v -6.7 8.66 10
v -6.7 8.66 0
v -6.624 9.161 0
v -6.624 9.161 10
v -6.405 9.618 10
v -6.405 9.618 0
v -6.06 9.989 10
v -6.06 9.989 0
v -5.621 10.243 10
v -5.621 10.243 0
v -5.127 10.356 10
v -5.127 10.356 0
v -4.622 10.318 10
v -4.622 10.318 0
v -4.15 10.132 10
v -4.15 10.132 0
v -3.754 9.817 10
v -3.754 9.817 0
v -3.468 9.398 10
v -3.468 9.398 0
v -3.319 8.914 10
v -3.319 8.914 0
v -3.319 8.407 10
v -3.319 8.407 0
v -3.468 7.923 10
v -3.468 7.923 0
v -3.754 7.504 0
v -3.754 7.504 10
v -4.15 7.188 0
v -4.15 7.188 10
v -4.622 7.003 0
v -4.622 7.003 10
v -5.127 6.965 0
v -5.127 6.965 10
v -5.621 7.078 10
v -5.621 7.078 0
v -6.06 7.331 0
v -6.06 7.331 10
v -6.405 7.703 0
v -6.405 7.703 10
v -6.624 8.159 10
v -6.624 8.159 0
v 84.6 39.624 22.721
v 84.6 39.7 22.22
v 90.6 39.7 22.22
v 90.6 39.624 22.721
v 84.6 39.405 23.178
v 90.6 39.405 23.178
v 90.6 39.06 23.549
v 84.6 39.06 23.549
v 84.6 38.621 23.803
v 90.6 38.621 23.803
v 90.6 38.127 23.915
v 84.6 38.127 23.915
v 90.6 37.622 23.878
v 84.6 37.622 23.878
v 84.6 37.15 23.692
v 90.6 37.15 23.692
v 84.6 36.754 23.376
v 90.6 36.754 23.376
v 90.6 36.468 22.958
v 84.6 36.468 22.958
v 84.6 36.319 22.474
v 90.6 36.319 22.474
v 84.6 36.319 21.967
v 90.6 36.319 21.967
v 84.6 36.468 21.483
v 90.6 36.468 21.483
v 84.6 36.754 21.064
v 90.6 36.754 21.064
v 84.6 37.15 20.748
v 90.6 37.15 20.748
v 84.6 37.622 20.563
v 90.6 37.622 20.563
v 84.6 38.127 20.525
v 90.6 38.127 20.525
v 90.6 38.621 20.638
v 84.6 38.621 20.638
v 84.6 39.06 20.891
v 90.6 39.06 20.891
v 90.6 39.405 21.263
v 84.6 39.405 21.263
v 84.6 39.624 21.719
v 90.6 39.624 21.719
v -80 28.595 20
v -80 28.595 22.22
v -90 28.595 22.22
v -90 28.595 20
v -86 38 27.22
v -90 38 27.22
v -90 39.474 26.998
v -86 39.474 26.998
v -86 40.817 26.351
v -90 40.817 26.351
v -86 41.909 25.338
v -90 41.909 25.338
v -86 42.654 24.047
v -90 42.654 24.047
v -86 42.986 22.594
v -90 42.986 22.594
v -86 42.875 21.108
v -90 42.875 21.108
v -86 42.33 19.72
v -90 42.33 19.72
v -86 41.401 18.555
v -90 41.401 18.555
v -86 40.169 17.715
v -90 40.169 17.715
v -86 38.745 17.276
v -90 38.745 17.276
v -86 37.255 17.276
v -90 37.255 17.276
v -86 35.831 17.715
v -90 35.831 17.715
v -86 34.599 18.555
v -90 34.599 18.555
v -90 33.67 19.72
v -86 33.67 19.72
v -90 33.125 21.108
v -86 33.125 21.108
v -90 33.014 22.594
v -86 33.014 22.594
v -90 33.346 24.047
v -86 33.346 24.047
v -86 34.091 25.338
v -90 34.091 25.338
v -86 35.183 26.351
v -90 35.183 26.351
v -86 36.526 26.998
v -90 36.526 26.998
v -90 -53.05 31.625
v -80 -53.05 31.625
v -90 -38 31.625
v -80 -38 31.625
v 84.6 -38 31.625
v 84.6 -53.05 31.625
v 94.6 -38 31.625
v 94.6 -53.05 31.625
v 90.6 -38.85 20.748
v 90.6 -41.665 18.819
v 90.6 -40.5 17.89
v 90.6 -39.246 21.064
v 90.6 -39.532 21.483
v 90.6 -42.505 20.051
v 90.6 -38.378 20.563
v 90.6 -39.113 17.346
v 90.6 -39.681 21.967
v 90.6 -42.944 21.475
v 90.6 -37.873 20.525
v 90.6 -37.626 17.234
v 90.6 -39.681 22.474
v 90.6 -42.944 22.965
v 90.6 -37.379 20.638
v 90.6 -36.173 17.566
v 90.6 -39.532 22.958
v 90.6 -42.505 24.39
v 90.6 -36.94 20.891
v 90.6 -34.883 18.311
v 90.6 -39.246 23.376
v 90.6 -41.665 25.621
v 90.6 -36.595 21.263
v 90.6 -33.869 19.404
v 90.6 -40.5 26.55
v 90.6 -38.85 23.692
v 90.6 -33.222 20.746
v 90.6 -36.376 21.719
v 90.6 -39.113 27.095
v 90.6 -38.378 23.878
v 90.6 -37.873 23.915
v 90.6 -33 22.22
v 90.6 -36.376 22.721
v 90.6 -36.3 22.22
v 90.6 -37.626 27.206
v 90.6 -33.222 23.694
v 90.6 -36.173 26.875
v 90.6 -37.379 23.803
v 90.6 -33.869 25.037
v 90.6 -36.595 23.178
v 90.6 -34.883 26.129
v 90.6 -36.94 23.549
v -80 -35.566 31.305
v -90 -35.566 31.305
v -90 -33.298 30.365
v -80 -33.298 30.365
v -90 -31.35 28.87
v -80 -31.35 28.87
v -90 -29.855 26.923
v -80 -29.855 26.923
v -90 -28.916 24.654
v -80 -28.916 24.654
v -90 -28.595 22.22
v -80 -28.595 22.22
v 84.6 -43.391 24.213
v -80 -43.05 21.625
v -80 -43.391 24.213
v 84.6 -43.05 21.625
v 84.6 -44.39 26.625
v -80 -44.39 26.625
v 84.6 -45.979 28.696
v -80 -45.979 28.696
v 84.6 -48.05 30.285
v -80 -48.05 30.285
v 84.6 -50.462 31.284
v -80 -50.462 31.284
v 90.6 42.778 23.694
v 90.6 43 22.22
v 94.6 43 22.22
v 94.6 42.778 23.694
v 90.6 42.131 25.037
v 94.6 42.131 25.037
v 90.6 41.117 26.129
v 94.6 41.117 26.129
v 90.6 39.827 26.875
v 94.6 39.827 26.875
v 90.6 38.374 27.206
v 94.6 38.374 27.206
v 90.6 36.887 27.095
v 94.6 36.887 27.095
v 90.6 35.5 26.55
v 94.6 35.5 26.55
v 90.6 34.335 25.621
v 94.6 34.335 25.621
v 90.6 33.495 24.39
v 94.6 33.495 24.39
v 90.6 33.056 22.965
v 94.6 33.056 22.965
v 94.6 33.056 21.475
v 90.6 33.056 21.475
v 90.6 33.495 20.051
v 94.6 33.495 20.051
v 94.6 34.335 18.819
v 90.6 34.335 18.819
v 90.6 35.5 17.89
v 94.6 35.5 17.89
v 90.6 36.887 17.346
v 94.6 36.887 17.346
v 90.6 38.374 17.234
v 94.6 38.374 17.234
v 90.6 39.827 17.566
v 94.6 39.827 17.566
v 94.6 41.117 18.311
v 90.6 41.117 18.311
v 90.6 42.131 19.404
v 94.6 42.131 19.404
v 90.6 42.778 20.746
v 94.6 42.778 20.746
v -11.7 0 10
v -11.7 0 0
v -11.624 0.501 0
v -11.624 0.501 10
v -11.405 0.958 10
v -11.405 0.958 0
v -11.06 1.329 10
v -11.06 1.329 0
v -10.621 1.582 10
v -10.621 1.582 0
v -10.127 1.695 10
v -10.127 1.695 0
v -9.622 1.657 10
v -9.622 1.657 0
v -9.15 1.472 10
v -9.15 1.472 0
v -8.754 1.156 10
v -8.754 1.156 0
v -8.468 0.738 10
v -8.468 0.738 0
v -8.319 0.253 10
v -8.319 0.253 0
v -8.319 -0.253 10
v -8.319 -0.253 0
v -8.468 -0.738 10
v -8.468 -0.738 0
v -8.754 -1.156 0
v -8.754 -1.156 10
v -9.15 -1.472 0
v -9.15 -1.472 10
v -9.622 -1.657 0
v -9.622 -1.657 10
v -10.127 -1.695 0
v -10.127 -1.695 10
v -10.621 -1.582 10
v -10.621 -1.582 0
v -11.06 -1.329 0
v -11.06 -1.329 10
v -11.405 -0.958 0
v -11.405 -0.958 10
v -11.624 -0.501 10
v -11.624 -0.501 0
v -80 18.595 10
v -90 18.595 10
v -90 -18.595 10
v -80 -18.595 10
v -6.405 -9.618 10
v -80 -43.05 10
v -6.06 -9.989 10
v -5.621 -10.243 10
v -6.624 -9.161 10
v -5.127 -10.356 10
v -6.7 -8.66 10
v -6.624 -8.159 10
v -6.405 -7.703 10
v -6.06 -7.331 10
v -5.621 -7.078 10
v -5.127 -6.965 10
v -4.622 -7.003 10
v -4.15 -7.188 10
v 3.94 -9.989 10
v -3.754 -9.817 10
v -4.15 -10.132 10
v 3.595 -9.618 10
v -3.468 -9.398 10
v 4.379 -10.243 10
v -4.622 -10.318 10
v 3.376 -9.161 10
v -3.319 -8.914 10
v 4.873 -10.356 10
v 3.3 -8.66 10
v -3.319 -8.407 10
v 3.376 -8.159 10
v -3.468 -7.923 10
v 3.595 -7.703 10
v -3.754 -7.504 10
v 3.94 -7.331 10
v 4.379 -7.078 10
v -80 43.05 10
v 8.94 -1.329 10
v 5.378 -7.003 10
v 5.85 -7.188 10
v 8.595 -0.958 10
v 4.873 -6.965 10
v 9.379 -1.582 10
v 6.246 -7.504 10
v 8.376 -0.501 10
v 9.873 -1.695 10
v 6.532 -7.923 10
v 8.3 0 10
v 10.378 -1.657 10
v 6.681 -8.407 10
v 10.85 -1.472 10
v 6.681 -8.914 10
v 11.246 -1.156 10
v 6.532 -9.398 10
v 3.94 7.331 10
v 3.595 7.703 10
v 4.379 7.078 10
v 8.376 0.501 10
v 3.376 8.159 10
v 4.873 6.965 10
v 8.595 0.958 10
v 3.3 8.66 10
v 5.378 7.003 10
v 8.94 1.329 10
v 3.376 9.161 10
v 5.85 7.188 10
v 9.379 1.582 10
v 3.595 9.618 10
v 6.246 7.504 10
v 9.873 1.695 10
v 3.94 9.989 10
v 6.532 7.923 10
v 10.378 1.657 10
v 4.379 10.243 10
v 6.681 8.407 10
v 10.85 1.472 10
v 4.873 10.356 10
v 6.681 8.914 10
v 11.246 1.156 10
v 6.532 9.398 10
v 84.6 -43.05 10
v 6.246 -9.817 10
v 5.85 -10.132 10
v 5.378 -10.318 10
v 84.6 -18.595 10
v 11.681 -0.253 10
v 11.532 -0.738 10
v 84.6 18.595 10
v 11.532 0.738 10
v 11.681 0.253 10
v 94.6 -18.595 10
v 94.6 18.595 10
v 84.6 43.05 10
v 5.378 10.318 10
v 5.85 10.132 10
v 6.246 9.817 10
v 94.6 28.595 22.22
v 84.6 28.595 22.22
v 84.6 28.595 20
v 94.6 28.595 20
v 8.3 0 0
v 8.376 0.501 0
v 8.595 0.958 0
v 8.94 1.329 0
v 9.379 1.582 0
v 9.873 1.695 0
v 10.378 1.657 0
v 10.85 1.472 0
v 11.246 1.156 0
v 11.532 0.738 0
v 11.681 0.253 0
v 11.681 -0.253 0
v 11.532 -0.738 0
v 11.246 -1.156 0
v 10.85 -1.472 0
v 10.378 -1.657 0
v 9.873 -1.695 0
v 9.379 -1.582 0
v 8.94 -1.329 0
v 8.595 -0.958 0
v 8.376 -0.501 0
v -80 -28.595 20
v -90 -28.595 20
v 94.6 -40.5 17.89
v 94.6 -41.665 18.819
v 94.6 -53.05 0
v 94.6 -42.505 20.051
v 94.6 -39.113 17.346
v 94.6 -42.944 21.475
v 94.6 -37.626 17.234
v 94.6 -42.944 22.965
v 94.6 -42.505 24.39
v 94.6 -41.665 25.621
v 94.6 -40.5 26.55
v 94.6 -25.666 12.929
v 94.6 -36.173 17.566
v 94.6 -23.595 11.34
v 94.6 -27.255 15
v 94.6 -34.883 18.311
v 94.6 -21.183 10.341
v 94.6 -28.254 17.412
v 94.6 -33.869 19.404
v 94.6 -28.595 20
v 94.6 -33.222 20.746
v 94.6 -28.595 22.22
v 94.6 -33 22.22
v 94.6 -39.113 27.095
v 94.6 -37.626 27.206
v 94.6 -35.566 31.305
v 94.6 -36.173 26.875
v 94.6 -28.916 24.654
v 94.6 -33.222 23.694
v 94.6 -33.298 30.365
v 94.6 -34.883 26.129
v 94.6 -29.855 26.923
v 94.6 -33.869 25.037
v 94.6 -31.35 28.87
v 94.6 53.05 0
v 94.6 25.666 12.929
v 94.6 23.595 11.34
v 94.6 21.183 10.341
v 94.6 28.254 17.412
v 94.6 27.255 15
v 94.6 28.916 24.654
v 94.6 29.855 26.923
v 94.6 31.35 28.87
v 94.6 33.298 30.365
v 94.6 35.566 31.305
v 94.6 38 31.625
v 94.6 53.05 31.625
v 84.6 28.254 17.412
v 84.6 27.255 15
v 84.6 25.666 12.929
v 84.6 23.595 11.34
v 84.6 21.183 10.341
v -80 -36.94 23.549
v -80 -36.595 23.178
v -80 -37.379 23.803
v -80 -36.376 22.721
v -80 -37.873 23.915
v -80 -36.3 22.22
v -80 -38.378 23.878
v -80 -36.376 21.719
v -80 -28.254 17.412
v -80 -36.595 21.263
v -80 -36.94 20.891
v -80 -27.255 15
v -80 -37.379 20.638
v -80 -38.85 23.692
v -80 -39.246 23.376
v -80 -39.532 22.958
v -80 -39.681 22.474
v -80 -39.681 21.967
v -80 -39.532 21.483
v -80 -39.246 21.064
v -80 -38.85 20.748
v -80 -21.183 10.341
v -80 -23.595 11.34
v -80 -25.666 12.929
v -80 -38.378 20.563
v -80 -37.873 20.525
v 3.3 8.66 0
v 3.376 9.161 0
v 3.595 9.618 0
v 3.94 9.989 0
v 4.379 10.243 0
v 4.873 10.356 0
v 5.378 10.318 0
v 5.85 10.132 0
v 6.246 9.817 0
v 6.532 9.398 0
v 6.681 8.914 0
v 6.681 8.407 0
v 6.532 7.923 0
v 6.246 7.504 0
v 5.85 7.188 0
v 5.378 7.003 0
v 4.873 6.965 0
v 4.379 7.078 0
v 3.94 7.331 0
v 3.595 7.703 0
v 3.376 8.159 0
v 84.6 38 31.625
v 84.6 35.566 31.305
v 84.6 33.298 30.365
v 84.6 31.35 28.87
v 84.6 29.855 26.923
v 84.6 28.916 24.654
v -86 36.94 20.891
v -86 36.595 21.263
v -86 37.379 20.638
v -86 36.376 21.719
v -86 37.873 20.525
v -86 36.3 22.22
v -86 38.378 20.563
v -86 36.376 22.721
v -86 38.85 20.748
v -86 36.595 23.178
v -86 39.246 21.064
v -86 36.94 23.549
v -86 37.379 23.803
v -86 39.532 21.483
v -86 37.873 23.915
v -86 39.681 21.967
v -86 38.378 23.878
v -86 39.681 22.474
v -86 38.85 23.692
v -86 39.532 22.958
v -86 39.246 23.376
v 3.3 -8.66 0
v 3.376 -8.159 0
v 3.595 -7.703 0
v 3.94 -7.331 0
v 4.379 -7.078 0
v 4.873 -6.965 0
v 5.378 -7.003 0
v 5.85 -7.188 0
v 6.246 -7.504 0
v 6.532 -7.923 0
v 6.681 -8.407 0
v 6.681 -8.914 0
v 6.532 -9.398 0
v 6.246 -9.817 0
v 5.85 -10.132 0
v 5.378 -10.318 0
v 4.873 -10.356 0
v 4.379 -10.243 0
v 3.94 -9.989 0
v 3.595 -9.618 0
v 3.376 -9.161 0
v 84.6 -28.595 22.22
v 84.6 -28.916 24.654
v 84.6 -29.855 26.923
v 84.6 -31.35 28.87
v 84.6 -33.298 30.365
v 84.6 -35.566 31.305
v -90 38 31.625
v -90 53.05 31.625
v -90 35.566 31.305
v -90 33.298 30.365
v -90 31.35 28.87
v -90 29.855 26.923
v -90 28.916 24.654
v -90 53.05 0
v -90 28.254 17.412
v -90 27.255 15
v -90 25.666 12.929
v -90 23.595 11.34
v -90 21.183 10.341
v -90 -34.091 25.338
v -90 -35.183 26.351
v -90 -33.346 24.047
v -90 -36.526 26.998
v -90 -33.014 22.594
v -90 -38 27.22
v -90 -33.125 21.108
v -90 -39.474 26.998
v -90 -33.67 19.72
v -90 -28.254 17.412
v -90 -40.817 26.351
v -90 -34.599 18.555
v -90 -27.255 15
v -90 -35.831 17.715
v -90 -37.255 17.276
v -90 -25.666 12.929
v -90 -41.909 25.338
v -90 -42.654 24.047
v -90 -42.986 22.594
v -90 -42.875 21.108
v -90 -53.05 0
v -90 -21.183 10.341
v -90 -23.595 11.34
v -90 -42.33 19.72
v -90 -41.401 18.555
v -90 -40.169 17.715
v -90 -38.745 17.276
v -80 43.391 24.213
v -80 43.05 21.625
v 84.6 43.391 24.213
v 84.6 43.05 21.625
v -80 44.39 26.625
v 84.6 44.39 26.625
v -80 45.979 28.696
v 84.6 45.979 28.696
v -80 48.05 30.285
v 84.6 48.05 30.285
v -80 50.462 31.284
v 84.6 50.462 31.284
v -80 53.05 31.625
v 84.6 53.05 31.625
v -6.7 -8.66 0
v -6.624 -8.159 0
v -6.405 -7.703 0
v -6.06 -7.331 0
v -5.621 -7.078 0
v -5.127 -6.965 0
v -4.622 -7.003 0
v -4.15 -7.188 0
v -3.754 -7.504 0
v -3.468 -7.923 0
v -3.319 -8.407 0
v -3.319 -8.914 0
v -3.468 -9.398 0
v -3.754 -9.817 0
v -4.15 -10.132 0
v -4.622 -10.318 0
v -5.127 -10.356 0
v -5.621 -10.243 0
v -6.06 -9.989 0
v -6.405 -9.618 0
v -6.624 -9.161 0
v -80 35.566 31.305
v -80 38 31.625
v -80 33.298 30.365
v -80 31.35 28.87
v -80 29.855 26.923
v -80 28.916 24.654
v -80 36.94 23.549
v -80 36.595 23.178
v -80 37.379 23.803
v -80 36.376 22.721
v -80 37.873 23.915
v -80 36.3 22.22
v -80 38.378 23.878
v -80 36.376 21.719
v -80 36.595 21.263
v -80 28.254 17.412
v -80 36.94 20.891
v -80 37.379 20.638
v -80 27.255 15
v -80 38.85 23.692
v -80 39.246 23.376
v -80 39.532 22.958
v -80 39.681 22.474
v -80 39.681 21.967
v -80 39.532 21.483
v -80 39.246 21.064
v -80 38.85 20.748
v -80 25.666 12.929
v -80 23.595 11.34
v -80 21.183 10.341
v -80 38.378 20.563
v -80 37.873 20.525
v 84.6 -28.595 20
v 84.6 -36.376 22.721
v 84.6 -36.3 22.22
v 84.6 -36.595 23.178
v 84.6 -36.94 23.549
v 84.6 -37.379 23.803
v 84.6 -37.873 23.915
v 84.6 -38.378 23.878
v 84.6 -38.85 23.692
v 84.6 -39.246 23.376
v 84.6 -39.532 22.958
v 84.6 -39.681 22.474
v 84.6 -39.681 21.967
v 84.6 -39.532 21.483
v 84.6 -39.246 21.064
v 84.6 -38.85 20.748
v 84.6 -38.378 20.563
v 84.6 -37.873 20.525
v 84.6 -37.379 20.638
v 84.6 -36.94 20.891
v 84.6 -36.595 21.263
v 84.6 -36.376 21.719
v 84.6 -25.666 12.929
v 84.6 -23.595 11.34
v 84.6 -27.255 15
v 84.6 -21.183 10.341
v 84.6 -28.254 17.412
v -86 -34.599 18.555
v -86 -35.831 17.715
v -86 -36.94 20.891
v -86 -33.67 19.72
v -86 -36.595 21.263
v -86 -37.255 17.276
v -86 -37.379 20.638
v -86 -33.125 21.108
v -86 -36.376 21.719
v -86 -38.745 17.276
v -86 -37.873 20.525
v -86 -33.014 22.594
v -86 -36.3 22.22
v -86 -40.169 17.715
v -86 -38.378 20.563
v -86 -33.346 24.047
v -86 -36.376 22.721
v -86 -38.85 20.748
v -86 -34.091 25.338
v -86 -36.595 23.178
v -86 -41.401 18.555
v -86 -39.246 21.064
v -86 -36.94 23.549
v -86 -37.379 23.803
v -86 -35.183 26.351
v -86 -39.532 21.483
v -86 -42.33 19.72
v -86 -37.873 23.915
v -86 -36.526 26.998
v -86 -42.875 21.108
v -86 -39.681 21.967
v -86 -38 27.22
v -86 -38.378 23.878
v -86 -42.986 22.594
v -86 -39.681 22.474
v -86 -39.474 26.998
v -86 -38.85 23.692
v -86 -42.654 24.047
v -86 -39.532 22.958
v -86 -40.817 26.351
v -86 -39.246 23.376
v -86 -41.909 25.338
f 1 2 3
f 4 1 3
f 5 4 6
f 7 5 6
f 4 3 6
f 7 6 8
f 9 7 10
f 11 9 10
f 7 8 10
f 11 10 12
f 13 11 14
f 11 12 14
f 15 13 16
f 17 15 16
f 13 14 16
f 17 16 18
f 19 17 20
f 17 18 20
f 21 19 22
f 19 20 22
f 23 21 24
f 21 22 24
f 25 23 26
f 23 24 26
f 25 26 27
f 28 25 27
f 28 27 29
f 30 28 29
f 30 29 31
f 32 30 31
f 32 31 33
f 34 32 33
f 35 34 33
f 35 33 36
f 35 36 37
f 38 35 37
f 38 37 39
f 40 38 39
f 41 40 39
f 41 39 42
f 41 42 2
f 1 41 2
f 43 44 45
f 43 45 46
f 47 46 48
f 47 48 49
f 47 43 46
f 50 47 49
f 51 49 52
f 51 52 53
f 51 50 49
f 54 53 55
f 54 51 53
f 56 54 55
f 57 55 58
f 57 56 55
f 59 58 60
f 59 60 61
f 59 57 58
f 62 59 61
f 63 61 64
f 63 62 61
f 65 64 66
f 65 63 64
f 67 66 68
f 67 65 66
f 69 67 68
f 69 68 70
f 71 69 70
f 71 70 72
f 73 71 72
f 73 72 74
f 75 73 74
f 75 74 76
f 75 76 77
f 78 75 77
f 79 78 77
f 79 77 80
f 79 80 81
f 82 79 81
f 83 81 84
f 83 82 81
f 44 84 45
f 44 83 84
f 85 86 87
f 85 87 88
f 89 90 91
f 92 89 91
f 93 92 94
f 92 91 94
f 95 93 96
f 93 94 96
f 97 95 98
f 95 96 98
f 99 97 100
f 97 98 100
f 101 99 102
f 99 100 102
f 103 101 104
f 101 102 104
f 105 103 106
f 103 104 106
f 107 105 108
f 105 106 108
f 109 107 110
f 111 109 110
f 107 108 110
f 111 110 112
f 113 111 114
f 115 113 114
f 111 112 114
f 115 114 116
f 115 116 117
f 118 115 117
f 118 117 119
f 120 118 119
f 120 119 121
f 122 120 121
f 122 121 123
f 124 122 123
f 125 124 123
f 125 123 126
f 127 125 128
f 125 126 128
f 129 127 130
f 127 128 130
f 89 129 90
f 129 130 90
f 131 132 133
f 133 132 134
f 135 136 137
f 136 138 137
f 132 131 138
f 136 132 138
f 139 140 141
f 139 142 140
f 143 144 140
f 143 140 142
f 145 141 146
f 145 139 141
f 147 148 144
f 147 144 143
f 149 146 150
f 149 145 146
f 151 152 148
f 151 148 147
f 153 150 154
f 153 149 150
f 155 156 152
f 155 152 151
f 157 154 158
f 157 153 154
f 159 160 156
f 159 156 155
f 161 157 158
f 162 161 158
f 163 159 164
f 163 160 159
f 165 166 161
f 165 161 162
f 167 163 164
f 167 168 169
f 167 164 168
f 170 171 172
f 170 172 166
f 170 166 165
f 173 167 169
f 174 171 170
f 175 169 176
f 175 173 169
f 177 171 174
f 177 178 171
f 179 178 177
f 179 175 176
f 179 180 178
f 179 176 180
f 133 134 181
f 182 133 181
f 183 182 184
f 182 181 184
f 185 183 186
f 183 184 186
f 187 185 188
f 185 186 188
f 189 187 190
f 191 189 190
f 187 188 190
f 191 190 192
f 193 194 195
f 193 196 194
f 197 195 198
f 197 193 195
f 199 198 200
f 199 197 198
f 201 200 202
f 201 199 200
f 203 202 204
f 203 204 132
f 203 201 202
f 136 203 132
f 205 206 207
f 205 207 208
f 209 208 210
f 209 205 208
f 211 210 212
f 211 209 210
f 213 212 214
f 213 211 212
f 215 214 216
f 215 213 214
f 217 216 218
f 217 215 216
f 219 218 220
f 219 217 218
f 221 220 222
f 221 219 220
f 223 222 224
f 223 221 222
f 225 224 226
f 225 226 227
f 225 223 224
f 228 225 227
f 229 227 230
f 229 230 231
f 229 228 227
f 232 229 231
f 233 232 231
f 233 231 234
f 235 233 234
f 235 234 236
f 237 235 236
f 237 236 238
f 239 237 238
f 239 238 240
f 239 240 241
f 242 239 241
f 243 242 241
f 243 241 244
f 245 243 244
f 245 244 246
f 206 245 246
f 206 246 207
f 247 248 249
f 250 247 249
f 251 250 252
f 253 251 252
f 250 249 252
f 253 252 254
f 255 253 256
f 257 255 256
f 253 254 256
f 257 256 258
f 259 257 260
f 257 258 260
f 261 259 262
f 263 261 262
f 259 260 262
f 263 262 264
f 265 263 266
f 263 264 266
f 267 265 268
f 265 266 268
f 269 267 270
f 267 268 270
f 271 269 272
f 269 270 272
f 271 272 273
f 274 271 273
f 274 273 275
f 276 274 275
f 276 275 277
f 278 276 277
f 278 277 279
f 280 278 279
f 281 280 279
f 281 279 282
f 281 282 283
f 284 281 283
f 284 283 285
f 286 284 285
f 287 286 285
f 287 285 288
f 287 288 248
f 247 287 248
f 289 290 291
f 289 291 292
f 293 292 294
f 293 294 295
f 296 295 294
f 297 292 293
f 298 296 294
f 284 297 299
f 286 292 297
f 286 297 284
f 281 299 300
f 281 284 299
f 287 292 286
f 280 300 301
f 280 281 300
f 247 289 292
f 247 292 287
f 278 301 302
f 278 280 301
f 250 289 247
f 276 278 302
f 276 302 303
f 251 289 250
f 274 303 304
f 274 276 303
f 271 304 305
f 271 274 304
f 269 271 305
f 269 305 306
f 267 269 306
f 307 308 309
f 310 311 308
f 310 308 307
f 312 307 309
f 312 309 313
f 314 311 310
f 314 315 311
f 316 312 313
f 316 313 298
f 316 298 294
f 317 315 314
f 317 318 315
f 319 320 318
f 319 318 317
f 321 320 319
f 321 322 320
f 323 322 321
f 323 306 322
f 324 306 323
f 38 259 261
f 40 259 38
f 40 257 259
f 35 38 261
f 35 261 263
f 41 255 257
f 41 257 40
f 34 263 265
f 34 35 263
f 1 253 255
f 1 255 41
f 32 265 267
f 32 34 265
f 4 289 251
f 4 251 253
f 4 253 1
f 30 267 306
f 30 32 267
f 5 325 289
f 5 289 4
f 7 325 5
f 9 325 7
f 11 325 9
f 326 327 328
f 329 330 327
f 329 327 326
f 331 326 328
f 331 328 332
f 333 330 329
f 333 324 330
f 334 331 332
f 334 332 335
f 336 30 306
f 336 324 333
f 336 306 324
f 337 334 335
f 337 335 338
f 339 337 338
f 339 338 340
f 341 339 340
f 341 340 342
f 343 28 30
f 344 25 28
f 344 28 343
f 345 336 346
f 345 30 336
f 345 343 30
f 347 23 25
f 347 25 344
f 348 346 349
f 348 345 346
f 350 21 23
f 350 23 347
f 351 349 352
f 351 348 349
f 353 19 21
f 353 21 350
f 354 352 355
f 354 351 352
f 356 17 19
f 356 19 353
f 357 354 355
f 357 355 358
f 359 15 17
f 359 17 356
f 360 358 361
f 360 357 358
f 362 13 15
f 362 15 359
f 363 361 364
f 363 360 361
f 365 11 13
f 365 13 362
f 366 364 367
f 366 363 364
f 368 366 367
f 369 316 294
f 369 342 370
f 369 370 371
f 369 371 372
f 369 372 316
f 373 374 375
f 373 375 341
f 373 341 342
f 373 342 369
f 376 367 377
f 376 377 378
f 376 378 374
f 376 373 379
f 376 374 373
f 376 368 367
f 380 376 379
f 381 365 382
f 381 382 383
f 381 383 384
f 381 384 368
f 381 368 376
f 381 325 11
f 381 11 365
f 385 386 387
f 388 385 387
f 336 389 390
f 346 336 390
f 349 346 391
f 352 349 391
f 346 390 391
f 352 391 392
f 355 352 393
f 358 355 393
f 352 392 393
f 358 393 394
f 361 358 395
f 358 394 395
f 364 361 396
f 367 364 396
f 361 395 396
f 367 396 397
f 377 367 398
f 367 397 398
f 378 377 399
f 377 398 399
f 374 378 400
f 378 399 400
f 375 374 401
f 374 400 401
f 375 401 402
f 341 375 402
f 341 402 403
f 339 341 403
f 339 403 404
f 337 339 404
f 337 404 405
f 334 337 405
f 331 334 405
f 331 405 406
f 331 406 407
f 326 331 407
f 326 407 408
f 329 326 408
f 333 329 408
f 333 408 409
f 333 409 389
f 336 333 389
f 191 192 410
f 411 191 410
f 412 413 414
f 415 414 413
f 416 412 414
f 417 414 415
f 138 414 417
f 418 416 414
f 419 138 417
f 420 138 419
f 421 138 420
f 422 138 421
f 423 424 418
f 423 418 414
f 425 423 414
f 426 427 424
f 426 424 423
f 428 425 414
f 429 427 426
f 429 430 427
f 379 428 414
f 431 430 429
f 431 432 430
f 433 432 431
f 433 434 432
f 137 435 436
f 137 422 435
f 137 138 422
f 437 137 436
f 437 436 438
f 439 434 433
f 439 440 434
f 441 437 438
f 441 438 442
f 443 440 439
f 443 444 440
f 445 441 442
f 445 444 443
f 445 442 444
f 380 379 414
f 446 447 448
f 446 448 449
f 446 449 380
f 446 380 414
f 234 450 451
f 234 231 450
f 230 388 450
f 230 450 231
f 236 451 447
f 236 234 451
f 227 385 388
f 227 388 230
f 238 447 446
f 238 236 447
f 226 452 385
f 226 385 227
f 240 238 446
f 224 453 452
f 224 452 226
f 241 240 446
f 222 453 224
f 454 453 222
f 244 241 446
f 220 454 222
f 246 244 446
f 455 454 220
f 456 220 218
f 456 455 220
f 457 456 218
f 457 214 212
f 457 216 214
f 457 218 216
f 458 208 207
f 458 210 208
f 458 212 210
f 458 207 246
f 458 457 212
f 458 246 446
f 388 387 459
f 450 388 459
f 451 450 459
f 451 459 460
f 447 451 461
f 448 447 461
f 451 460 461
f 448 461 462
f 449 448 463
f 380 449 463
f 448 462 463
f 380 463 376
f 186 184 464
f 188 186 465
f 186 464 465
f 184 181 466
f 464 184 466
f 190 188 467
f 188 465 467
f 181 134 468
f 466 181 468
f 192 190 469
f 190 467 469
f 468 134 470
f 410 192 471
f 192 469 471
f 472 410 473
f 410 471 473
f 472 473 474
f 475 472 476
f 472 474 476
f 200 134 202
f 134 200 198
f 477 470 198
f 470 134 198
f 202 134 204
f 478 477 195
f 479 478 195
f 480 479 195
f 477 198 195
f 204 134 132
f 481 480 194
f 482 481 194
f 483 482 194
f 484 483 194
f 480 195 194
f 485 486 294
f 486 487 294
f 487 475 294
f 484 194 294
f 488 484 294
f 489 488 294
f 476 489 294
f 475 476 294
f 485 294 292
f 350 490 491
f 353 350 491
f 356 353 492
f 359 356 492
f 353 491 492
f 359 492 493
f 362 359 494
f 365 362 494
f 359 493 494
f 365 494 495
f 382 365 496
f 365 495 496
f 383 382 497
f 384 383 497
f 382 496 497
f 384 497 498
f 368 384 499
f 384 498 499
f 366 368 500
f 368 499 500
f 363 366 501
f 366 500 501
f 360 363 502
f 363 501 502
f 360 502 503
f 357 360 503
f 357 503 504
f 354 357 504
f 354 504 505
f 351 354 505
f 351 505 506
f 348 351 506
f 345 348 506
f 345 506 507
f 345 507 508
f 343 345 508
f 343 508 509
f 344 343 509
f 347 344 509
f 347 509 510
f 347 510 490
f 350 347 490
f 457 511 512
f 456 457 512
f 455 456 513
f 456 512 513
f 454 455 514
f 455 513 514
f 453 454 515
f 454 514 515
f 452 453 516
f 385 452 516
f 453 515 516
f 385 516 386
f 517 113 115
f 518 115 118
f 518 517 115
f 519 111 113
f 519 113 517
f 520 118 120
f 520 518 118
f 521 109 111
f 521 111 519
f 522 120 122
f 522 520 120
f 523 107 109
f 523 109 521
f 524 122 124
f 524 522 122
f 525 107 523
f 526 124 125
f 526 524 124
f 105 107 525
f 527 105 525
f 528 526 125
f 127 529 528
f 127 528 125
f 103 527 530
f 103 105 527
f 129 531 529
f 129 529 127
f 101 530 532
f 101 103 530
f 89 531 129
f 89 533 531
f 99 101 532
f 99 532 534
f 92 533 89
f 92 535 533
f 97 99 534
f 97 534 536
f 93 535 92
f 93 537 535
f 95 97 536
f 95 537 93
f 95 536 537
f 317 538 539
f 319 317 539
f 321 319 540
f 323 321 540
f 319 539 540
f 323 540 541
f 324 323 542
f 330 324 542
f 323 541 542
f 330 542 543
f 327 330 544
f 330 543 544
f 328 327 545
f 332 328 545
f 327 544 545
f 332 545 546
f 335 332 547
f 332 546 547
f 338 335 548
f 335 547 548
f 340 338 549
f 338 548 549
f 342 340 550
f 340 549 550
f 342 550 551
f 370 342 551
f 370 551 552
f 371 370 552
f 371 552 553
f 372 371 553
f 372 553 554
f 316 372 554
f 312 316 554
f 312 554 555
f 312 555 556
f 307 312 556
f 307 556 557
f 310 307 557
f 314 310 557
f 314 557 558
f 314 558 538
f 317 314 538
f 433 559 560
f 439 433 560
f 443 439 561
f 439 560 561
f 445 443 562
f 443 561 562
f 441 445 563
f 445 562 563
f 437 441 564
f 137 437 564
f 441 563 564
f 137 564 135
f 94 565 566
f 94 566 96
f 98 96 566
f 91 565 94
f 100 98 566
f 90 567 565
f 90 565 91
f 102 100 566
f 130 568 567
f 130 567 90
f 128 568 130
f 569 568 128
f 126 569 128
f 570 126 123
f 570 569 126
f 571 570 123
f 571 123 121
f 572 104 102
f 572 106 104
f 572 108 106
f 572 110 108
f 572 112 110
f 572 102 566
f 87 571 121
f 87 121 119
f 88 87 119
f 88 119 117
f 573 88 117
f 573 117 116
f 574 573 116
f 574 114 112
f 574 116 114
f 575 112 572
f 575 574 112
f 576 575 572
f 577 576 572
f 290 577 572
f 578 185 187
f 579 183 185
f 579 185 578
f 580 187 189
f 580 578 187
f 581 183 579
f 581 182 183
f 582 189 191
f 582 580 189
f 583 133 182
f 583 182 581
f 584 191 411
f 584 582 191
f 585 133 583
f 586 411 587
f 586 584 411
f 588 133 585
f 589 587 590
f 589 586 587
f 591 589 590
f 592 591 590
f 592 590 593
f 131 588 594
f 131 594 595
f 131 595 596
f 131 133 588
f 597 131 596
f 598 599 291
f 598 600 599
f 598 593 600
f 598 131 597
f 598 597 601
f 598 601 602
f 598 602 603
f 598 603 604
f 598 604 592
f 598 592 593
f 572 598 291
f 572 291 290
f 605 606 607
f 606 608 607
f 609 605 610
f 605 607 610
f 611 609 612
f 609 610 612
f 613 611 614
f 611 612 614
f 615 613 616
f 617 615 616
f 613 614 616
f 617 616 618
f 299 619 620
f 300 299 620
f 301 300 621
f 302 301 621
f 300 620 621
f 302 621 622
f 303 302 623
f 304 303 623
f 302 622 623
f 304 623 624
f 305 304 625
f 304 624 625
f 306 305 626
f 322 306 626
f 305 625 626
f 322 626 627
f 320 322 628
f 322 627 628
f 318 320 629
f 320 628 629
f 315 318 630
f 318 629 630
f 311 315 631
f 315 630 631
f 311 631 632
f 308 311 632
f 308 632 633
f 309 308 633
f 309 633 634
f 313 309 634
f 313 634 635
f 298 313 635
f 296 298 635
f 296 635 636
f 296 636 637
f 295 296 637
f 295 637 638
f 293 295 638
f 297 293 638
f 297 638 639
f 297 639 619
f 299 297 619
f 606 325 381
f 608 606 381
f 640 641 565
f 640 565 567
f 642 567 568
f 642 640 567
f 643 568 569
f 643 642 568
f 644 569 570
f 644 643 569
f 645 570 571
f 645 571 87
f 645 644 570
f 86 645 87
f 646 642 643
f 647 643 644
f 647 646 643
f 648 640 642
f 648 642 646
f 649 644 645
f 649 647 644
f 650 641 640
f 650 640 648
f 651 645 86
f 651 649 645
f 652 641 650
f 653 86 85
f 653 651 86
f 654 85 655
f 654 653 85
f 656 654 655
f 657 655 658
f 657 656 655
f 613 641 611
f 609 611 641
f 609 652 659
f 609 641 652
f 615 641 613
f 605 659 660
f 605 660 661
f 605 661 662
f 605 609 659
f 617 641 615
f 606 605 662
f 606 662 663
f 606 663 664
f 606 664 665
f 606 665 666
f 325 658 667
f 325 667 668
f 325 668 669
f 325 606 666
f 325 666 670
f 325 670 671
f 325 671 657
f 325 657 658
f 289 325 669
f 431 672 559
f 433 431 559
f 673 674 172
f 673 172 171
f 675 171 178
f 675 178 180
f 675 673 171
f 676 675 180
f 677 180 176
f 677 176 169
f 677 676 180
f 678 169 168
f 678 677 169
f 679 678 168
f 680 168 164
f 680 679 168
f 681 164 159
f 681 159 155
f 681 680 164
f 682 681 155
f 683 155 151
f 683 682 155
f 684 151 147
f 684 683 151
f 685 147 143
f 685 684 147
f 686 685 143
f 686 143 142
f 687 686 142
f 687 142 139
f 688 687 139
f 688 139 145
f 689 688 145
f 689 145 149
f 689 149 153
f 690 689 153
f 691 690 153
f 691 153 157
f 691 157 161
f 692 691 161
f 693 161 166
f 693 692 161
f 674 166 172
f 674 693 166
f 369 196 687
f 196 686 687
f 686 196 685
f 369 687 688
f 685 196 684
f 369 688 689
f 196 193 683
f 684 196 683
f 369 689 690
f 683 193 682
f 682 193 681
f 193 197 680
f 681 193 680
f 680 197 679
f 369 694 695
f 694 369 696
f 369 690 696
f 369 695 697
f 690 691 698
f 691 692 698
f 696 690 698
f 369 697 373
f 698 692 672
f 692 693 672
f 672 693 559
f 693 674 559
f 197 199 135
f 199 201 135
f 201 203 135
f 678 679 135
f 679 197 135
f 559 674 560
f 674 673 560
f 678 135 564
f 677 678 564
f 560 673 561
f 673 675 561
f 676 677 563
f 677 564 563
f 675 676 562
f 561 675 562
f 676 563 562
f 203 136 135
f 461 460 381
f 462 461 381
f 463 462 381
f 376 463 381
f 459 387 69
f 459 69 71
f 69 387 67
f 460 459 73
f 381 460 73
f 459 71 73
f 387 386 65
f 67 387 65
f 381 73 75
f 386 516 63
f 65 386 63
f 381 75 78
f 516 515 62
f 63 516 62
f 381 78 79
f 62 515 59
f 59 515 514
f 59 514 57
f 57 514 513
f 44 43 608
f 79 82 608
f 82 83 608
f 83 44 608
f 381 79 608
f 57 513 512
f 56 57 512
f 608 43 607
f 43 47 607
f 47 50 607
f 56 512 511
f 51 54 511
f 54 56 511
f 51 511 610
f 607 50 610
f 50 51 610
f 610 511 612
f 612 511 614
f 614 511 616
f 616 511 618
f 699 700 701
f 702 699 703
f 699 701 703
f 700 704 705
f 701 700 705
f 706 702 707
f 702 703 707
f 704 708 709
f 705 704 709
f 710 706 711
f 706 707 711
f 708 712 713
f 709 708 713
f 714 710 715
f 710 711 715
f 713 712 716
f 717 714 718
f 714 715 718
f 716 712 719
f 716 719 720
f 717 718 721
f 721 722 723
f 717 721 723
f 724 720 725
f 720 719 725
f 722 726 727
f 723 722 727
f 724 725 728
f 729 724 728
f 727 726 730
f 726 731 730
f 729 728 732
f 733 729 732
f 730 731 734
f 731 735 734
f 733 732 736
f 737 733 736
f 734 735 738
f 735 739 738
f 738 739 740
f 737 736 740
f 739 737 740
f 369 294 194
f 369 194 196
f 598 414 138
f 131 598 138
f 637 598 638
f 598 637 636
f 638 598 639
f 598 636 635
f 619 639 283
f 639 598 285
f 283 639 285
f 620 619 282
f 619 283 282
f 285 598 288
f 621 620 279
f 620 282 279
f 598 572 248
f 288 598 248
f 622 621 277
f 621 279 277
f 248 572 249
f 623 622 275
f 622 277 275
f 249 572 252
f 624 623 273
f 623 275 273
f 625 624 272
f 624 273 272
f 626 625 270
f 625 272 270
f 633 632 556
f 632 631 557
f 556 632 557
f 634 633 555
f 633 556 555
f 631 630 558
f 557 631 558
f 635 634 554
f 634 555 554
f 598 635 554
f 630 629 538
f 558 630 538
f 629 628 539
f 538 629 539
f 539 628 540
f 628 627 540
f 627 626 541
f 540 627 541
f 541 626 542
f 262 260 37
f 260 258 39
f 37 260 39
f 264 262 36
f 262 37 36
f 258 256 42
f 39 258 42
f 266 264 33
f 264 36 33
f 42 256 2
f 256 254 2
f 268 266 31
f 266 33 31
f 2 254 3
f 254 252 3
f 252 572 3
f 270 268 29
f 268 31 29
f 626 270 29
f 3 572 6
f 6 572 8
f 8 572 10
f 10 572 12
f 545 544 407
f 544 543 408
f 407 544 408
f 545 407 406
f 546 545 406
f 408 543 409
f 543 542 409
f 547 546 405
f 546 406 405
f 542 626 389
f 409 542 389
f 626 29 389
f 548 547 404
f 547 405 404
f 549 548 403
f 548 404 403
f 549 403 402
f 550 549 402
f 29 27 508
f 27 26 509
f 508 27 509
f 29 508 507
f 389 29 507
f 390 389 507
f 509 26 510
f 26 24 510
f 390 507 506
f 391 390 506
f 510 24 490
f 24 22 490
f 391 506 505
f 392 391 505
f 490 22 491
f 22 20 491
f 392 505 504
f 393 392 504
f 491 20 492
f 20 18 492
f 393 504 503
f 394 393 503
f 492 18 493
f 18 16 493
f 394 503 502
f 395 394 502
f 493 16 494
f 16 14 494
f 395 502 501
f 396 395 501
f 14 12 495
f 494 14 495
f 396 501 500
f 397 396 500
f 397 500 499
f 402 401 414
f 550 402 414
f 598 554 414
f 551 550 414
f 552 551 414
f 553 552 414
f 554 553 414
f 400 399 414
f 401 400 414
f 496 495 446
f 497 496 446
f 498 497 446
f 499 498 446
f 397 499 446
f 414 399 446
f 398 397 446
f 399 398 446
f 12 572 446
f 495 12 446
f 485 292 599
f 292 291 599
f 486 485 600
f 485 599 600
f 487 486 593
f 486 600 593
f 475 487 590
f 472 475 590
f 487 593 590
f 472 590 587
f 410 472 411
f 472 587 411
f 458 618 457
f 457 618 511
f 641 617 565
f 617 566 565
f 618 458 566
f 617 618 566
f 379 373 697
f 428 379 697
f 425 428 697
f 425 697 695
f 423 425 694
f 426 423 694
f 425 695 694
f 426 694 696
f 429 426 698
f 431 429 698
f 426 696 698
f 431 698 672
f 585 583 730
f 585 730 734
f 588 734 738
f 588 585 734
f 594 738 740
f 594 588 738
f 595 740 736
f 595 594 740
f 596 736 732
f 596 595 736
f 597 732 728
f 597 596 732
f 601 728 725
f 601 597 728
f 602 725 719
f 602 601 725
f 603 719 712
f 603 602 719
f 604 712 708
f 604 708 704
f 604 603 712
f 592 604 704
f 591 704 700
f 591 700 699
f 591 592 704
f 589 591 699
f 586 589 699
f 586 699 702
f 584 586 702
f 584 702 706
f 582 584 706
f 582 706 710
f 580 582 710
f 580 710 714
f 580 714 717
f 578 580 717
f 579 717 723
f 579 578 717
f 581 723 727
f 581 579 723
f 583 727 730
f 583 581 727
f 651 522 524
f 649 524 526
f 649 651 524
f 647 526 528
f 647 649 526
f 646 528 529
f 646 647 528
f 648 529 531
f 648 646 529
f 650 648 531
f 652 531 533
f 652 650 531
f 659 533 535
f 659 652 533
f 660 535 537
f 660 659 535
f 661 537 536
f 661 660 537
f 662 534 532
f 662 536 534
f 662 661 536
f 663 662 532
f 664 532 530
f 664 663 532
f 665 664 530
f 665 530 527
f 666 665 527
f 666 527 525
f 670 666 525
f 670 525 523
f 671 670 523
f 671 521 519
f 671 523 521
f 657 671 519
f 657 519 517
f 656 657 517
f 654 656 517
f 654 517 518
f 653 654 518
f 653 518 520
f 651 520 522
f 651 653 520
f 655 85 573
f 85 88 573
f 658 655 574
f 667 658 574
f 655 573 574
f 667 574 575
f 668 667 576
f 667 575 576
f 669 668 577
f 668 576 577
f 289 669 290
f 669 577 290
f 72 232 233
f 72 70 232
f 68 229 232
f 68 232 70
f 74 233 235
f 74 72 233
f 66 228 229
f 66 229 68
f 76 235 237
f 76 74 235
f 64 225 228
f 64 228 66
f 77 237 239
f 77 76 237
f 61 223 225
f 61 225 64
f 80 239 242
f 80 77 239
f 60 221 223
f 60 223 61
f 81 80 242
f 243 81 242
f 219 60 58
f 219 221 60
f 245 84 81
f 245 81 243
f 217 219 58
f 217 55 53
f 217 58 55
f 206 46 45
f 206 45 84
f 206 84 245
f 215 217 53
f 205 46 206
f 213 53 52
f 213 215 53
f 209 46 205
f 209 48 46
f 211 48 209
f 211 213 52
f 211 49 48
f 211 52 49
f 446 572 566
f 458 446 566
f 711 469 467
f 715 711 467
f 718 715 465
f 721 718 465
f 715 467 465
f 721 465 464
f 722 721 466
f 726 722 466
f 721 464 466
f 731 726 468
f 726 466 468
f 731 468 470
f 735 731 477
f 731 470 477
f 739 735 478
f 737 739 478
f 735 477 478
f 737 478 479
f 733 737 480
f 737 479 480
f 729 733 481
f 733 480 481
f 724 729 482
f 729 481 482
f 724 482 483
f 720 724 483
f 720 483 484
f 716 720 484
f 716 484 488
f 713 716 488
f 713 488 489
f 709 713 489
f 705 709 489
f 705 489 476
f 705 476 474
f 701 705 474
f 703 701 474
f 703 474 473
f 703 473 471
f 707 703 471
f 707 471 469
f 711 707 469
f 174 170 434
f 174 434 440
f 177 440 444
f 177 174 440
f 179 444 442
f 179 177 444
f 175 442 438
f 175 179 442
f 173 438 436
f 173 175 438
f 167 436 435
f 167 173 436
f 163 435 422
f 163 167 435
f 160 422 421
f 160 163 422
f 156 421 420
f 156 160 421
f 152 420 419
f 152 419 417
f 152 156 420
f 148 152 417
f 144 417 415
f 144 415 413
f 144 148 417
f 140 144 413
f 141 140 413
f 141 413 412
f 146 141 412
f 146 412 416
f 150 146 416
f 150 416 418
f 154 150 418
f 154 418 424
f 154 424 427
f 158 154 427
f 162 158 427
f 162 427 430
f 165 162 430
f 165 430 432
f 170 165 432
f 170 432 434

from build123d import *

# Parameters (mm, degrees)
SKETCH1_W             = 184.6
SKETCH1_H             = 106.1
BOSS_EXTRUDE1_DEPTH   = 10
CUT_EXTRUDE2_REACH    = 110.92
SKETCH7_R             = 1.7
SKETCH3_W             = 164.6
SKETCH3_H             = 10
BOSS_EXTRUDE2_DEPTH   = 21.625
FILLET1_R             = 10
SKETCH5_R             = 1.7
BOSS_EXTRUDE3_DEPTH   = 10
SKETCH6_R             = 5
CUT_EXTRUDE1_DEPTH    = 4
FILLET2_R             = 10
FILLET2_OF_MIRROR1_R  = 10
MIRROR2_START         = 84.6
MIRROR2_OUTLINE_R     = 5
MIRROR2_DEPTH         = 10
MIRROR2_2_OUTLINE_R   = 5
MIRROR2_2_OUTLINE_R_2 = 1.7
MIRROR2_2_DEPTH       = 6


# Read off the part's stored shape, not the designer's step: Mirror2
with BuildPart() as part:
    # Sketch1 → Boss-Extrude1 (new body)
    with BuildSketch(Plane.XY):
        with Locations((2.3, 0)):
            Rectangle(SKETCH1_W, SKETCH1_H)
    extrude(amount=BOSS_EXTRUDE1_DEPTH)

    # Sketch7 → Cut-Extrude2 (cut, up to next)
    with BuildSketch(Plane(origin=(0, 0, 0), x_dir=(-1, 0, 0), z_dir=(0, 0, -1)), mode=Mode.PRIVATE) as cut_extrude2_sk1:
        with Locations((-10, 0)):
            Circle(SKETCH7_R)
    cut_extrude2_tool1 = extrude(cut_extrude2_sk1.sketch, amount=-CUT_EXTRUDE2_REACH, mode=Mode.PRIVATE) & part.part
    # Sketch7 → Cut-Extrude2 (cut, up to next)
    with BuildSketch(Plane(origin=(0, 0, 0), x_dir=(-1, 0, 0), z_dir=(0, 0, -1)), mode=Mode.PRIVATE) as cut_extrude2_sk2:
        with Locations((-5, 8.660254038)):
            Circle(SKETCH7_R)
    cut_extrude2_tool2 = extrude(cut_extrude2_sk2.sketch, amount=-CUT_EXTRUDE2_REACH, mode=Mode.PRIVATE) & part.part
    # Sketch7 → Cut-Extrude2 (cut, up to next)
    with BuildSketch(Plane(origin=(0, 0, 0), x_dir=(-1, 0, 0), z_dir=(0, 0, -1)), mode=Mode.PRIVATE) as cut_extrude2_sk3:
        with Locations((5, 8.660254038)):
            Circle(SKETCH7_R)
    cut_extrude2_tool3 = extrude(cut_extrude2_sk3.sketch, amount=-CUT_EXTRUDE2_REACH, mode=Mode.PRIVATE) & part.part
    # Sketch7 → Cut-Extrude2 (cut, up to next)
    with BuildSketch(Plane(origin=(0, 0, 0), x_dir=(-1, 0, 0), z_dir=(0, 0, -1)), mode=Mode.PRIVATE) as cut_extrude2_sk4:
        with Locations((10, 0)):
            Circle(SKETCH7_R)
    cut_extrude2_tool4 = extrude(cut_extrude2_sk4.sketch, amount=-CUT_EXTRUDE2_REACH, mode=Mode.PRIVATE) & part.part
    # Sketch7 → Cut-Extrude2 (cut, up to next)
    with BuildSketch(Plane(origin=(0, 0, 0), x_dir=(-1, 0, 0), z_dir=(0, 0, -1)), mode=Mode.PRIVATE) as cut_extrude2_sk5:
        with Locations((5, -8.660254038)):
            Circle(SKETCH7_R)
    cut_extrude2_tool5 = extrude(cut_extrude2_sk5.sketch, amount=-CUT_EXTRUDE2_REACH, mode=Mode.PRIVATE) & part.part
    # Sketch7 → Cut-Extrude2 (cut, up to next)
    with BuildSketch(Plane(origin=(0, 0, 0), x_dir=(-1, 0, 0), z_dir=(0, 0, -1)), mode=Mode.PRIVATE) as cut_extrude2_sk6:
        with Locations((-5, -8.660254038)):
            Circle(SKETCH7_R)
    cut_extrude2_tool6 = extrude(cut_extrude2_sk6.sketch, amount=-CUT_EXTRUDE2_REACH, mode=Mode.PRIVATE) & part.part
    add(cut_extrude2_tool1.solids().sort_by_distance((10, 0, 0))[0], mode=Mode.SUBTRACT)
    add(cut_extrude2_tool2.solids().sort_by_distance((5, 8.660254, 0))[0], mode=Mode.SUBTRACT)
    add(cut_extrude2_tool3.solids().sort_by_distance((-5, 8.660254, 0))[0], mode=Mode.SUBTRACT)
    add(cut_extrude2_tool4.solids().sort_by_distance((-10, 0, 0))[0], mode=Mode.SUBTRACT)
    add(cut_extrude2_tool5.solids().sort_by_distance((-5, -8.660254, 0))[0], mode=Mode.SUBTRACT)
    add(cut_extrude2_tool6.solids().sort_by_distance((5, -8.660254, 0))[0], mode=Mode.SUBTRACT)

    # Sketch3 → Boss-Extrude2 (add)
    with BuildSketch(Plane.XY.offset(10)):
        with Locations((2.3, 48.05)):
            Rectangle(SKETCH3_W, SKETCH3_H)
        with Locations((2.3, -48.05)):
            Rectangle(SKETCH3_W, SKETCH3_H)
    extrude(amount=BOSS_EXTRUDE2_DEPTH)

    # Fillet1
    fillet1_edges = [part.edges().sort_by_distance(p)[0] for p in [
        (2.3, 43.05, 31.625),
        (2.3, -43.05, 31.625),
    ]]
    fillet(fillet1_edges, radius=FILLET1_R - 0.0001)  # a hair under: the kernel refuses the full size

    # Sketch5 → Boss-Extrude3 (add)
    with BuildSketch(Plane.ZY.offset(80)):
        with BuildLine():
            Line((31.625, 53.05), (31.625, 38))
            ThreePointArc((31.625, 38), (28.870383682, 31.349767926), (22.220151608, 28.595151608))
            Line((22.220151608, 28.595151608), (10, 28.595151608))
            Line((10, 28.595151608), (10, 53.05))
            Line((10, 53.05), (31.625, 53.05))
        make_face()
        with Locations(Location((22.220151608, 38, 0), (0, 0, 270))):
            Circle(SKETCH5_R, mode=Mode.SUBTRACT)
    boss_extrude3 = extrude(amount=BOSS_EXTRUDE3_DEPTH)

    # Sketch6 → Cut-Extrude1 (cut)
    with BuildSketch(Plane.ZY.offset(90)):
        with Locations((22.220151608, 38)):
            Circle(SKETCH6_R)
    cut_extrude1 = extrude(amount=-CUT_EXTRUDE1_DEPTH, mode=Mode.SUBTRACT)

    # Fillet2
    fillet2_edges = [part.edges().sort_by_distance(p)[0] for p in [
        (-85, 28.595151608, 10),
    ]]
    fillet(fillet2_edges, radius=FILLET2_R)

    # Mirror1: Boss-Extrude3, Cut-Extrude1 across plane
    add(boss_extrude3.mirror(Plane.ZX))
    add(cut_extrude1.mirror(Plane.ZX), mode=Mode.SUBTRACT)

    # Fillet2 of Mirror1
    fillet2_of_mirror1_edges = [part.edges().sort_by_distance(p)[0] for p in [
        (-85, -28.595151608, 10),
    ]]
    fillet(fillet2_of_mirror1_edges, radius=FILLET2_OF_MIRROR1_R)

    # Mirror2 outline → Mirror2 (add)
    # profile 1 of 2: a face of its own
    with BuildSketch(Plane.YZ.offset(MIRROR2_START)):
        with BuildLine():
            ThreePointArc((38, 31.625), (31.349767926, 28.870383682), (28.595151608, 22.220151608))
            Line((28.595151608, 22.220151608), (28.595151608, 20))
            ThreePointArc((28.595151608, 20), (25.66621942, 12.928932188), (18.595151608, 10))
            Line((18.595151608, 10), (53.05, 10))
            Line((53.05, 10), (53.05, 31.625))
            Line((53.05, 31.625), (38, 31.625))
        make_face()
        with Locations((38, 22.220151608)):
            Circle(MIRROR2_OUTLINE_R, mode=Mode.SUBTRACT)
    # profile 2 of 2: a face of its own
    with BuildSketch(Plane.YZ.offset(MIRROR2_START)):
        with BuildLine():
            Line((-53.05, 10), (-18.595151608, 10))
            ThreePointArc((-18.595151608, 10), (-25.66621942, 12.928932188), (-28.595151608, 20))
            Line((-28.595151608, 20), (-28.595151608, 22.220151608))
            ThreePointArc((-28.595151608, 22.220151608), (-31.349767926, 28.870383682), (-38, 31.625))
            Line((-38, 31.625), (-53.05, 31.625))
            Line((-53.05, 31.625), (-53.05, 10))
        make_face()
        with Locations((-38, 22.220151608)):
            Circle(MIRROR2_OUTLINE_R, mode=Mode.SUBTRACT)
    extrude(amount=MIRROR2_DEPTH)

    # Mirror2 2 outline → Mirror2 2 (add)
    # profile 1 of 2: a face of its own
    with BuildSketch(Plane.YZ.offset(MIRROR2_START)):
        with Locations((38, 22.220151608)):
            Circle(MIRROR2_2_OUTLINE_R)
        with Locations((38, 22.220151608)):
            Circle(MIRROR2_2_OUTLINE_R_2, mode=Mode.SUBTRACT)
    # profile 2 of 2: a face of its own
    with BuildSketch(Plane.YZ.offset(MIRROR2_START)):
        with Locations((-38, 22.220151608)):
            Circle(MIRROR2_2_OUTLINE_R)
        with Locations((-38, 22.220151608)):
            Circle(MIRROR2_2_OUTLINE_R_2, mode=Mode.SUBTRACT)
    extrude(amount=MIRROR2_2_DEPTH)


solid = part.part
